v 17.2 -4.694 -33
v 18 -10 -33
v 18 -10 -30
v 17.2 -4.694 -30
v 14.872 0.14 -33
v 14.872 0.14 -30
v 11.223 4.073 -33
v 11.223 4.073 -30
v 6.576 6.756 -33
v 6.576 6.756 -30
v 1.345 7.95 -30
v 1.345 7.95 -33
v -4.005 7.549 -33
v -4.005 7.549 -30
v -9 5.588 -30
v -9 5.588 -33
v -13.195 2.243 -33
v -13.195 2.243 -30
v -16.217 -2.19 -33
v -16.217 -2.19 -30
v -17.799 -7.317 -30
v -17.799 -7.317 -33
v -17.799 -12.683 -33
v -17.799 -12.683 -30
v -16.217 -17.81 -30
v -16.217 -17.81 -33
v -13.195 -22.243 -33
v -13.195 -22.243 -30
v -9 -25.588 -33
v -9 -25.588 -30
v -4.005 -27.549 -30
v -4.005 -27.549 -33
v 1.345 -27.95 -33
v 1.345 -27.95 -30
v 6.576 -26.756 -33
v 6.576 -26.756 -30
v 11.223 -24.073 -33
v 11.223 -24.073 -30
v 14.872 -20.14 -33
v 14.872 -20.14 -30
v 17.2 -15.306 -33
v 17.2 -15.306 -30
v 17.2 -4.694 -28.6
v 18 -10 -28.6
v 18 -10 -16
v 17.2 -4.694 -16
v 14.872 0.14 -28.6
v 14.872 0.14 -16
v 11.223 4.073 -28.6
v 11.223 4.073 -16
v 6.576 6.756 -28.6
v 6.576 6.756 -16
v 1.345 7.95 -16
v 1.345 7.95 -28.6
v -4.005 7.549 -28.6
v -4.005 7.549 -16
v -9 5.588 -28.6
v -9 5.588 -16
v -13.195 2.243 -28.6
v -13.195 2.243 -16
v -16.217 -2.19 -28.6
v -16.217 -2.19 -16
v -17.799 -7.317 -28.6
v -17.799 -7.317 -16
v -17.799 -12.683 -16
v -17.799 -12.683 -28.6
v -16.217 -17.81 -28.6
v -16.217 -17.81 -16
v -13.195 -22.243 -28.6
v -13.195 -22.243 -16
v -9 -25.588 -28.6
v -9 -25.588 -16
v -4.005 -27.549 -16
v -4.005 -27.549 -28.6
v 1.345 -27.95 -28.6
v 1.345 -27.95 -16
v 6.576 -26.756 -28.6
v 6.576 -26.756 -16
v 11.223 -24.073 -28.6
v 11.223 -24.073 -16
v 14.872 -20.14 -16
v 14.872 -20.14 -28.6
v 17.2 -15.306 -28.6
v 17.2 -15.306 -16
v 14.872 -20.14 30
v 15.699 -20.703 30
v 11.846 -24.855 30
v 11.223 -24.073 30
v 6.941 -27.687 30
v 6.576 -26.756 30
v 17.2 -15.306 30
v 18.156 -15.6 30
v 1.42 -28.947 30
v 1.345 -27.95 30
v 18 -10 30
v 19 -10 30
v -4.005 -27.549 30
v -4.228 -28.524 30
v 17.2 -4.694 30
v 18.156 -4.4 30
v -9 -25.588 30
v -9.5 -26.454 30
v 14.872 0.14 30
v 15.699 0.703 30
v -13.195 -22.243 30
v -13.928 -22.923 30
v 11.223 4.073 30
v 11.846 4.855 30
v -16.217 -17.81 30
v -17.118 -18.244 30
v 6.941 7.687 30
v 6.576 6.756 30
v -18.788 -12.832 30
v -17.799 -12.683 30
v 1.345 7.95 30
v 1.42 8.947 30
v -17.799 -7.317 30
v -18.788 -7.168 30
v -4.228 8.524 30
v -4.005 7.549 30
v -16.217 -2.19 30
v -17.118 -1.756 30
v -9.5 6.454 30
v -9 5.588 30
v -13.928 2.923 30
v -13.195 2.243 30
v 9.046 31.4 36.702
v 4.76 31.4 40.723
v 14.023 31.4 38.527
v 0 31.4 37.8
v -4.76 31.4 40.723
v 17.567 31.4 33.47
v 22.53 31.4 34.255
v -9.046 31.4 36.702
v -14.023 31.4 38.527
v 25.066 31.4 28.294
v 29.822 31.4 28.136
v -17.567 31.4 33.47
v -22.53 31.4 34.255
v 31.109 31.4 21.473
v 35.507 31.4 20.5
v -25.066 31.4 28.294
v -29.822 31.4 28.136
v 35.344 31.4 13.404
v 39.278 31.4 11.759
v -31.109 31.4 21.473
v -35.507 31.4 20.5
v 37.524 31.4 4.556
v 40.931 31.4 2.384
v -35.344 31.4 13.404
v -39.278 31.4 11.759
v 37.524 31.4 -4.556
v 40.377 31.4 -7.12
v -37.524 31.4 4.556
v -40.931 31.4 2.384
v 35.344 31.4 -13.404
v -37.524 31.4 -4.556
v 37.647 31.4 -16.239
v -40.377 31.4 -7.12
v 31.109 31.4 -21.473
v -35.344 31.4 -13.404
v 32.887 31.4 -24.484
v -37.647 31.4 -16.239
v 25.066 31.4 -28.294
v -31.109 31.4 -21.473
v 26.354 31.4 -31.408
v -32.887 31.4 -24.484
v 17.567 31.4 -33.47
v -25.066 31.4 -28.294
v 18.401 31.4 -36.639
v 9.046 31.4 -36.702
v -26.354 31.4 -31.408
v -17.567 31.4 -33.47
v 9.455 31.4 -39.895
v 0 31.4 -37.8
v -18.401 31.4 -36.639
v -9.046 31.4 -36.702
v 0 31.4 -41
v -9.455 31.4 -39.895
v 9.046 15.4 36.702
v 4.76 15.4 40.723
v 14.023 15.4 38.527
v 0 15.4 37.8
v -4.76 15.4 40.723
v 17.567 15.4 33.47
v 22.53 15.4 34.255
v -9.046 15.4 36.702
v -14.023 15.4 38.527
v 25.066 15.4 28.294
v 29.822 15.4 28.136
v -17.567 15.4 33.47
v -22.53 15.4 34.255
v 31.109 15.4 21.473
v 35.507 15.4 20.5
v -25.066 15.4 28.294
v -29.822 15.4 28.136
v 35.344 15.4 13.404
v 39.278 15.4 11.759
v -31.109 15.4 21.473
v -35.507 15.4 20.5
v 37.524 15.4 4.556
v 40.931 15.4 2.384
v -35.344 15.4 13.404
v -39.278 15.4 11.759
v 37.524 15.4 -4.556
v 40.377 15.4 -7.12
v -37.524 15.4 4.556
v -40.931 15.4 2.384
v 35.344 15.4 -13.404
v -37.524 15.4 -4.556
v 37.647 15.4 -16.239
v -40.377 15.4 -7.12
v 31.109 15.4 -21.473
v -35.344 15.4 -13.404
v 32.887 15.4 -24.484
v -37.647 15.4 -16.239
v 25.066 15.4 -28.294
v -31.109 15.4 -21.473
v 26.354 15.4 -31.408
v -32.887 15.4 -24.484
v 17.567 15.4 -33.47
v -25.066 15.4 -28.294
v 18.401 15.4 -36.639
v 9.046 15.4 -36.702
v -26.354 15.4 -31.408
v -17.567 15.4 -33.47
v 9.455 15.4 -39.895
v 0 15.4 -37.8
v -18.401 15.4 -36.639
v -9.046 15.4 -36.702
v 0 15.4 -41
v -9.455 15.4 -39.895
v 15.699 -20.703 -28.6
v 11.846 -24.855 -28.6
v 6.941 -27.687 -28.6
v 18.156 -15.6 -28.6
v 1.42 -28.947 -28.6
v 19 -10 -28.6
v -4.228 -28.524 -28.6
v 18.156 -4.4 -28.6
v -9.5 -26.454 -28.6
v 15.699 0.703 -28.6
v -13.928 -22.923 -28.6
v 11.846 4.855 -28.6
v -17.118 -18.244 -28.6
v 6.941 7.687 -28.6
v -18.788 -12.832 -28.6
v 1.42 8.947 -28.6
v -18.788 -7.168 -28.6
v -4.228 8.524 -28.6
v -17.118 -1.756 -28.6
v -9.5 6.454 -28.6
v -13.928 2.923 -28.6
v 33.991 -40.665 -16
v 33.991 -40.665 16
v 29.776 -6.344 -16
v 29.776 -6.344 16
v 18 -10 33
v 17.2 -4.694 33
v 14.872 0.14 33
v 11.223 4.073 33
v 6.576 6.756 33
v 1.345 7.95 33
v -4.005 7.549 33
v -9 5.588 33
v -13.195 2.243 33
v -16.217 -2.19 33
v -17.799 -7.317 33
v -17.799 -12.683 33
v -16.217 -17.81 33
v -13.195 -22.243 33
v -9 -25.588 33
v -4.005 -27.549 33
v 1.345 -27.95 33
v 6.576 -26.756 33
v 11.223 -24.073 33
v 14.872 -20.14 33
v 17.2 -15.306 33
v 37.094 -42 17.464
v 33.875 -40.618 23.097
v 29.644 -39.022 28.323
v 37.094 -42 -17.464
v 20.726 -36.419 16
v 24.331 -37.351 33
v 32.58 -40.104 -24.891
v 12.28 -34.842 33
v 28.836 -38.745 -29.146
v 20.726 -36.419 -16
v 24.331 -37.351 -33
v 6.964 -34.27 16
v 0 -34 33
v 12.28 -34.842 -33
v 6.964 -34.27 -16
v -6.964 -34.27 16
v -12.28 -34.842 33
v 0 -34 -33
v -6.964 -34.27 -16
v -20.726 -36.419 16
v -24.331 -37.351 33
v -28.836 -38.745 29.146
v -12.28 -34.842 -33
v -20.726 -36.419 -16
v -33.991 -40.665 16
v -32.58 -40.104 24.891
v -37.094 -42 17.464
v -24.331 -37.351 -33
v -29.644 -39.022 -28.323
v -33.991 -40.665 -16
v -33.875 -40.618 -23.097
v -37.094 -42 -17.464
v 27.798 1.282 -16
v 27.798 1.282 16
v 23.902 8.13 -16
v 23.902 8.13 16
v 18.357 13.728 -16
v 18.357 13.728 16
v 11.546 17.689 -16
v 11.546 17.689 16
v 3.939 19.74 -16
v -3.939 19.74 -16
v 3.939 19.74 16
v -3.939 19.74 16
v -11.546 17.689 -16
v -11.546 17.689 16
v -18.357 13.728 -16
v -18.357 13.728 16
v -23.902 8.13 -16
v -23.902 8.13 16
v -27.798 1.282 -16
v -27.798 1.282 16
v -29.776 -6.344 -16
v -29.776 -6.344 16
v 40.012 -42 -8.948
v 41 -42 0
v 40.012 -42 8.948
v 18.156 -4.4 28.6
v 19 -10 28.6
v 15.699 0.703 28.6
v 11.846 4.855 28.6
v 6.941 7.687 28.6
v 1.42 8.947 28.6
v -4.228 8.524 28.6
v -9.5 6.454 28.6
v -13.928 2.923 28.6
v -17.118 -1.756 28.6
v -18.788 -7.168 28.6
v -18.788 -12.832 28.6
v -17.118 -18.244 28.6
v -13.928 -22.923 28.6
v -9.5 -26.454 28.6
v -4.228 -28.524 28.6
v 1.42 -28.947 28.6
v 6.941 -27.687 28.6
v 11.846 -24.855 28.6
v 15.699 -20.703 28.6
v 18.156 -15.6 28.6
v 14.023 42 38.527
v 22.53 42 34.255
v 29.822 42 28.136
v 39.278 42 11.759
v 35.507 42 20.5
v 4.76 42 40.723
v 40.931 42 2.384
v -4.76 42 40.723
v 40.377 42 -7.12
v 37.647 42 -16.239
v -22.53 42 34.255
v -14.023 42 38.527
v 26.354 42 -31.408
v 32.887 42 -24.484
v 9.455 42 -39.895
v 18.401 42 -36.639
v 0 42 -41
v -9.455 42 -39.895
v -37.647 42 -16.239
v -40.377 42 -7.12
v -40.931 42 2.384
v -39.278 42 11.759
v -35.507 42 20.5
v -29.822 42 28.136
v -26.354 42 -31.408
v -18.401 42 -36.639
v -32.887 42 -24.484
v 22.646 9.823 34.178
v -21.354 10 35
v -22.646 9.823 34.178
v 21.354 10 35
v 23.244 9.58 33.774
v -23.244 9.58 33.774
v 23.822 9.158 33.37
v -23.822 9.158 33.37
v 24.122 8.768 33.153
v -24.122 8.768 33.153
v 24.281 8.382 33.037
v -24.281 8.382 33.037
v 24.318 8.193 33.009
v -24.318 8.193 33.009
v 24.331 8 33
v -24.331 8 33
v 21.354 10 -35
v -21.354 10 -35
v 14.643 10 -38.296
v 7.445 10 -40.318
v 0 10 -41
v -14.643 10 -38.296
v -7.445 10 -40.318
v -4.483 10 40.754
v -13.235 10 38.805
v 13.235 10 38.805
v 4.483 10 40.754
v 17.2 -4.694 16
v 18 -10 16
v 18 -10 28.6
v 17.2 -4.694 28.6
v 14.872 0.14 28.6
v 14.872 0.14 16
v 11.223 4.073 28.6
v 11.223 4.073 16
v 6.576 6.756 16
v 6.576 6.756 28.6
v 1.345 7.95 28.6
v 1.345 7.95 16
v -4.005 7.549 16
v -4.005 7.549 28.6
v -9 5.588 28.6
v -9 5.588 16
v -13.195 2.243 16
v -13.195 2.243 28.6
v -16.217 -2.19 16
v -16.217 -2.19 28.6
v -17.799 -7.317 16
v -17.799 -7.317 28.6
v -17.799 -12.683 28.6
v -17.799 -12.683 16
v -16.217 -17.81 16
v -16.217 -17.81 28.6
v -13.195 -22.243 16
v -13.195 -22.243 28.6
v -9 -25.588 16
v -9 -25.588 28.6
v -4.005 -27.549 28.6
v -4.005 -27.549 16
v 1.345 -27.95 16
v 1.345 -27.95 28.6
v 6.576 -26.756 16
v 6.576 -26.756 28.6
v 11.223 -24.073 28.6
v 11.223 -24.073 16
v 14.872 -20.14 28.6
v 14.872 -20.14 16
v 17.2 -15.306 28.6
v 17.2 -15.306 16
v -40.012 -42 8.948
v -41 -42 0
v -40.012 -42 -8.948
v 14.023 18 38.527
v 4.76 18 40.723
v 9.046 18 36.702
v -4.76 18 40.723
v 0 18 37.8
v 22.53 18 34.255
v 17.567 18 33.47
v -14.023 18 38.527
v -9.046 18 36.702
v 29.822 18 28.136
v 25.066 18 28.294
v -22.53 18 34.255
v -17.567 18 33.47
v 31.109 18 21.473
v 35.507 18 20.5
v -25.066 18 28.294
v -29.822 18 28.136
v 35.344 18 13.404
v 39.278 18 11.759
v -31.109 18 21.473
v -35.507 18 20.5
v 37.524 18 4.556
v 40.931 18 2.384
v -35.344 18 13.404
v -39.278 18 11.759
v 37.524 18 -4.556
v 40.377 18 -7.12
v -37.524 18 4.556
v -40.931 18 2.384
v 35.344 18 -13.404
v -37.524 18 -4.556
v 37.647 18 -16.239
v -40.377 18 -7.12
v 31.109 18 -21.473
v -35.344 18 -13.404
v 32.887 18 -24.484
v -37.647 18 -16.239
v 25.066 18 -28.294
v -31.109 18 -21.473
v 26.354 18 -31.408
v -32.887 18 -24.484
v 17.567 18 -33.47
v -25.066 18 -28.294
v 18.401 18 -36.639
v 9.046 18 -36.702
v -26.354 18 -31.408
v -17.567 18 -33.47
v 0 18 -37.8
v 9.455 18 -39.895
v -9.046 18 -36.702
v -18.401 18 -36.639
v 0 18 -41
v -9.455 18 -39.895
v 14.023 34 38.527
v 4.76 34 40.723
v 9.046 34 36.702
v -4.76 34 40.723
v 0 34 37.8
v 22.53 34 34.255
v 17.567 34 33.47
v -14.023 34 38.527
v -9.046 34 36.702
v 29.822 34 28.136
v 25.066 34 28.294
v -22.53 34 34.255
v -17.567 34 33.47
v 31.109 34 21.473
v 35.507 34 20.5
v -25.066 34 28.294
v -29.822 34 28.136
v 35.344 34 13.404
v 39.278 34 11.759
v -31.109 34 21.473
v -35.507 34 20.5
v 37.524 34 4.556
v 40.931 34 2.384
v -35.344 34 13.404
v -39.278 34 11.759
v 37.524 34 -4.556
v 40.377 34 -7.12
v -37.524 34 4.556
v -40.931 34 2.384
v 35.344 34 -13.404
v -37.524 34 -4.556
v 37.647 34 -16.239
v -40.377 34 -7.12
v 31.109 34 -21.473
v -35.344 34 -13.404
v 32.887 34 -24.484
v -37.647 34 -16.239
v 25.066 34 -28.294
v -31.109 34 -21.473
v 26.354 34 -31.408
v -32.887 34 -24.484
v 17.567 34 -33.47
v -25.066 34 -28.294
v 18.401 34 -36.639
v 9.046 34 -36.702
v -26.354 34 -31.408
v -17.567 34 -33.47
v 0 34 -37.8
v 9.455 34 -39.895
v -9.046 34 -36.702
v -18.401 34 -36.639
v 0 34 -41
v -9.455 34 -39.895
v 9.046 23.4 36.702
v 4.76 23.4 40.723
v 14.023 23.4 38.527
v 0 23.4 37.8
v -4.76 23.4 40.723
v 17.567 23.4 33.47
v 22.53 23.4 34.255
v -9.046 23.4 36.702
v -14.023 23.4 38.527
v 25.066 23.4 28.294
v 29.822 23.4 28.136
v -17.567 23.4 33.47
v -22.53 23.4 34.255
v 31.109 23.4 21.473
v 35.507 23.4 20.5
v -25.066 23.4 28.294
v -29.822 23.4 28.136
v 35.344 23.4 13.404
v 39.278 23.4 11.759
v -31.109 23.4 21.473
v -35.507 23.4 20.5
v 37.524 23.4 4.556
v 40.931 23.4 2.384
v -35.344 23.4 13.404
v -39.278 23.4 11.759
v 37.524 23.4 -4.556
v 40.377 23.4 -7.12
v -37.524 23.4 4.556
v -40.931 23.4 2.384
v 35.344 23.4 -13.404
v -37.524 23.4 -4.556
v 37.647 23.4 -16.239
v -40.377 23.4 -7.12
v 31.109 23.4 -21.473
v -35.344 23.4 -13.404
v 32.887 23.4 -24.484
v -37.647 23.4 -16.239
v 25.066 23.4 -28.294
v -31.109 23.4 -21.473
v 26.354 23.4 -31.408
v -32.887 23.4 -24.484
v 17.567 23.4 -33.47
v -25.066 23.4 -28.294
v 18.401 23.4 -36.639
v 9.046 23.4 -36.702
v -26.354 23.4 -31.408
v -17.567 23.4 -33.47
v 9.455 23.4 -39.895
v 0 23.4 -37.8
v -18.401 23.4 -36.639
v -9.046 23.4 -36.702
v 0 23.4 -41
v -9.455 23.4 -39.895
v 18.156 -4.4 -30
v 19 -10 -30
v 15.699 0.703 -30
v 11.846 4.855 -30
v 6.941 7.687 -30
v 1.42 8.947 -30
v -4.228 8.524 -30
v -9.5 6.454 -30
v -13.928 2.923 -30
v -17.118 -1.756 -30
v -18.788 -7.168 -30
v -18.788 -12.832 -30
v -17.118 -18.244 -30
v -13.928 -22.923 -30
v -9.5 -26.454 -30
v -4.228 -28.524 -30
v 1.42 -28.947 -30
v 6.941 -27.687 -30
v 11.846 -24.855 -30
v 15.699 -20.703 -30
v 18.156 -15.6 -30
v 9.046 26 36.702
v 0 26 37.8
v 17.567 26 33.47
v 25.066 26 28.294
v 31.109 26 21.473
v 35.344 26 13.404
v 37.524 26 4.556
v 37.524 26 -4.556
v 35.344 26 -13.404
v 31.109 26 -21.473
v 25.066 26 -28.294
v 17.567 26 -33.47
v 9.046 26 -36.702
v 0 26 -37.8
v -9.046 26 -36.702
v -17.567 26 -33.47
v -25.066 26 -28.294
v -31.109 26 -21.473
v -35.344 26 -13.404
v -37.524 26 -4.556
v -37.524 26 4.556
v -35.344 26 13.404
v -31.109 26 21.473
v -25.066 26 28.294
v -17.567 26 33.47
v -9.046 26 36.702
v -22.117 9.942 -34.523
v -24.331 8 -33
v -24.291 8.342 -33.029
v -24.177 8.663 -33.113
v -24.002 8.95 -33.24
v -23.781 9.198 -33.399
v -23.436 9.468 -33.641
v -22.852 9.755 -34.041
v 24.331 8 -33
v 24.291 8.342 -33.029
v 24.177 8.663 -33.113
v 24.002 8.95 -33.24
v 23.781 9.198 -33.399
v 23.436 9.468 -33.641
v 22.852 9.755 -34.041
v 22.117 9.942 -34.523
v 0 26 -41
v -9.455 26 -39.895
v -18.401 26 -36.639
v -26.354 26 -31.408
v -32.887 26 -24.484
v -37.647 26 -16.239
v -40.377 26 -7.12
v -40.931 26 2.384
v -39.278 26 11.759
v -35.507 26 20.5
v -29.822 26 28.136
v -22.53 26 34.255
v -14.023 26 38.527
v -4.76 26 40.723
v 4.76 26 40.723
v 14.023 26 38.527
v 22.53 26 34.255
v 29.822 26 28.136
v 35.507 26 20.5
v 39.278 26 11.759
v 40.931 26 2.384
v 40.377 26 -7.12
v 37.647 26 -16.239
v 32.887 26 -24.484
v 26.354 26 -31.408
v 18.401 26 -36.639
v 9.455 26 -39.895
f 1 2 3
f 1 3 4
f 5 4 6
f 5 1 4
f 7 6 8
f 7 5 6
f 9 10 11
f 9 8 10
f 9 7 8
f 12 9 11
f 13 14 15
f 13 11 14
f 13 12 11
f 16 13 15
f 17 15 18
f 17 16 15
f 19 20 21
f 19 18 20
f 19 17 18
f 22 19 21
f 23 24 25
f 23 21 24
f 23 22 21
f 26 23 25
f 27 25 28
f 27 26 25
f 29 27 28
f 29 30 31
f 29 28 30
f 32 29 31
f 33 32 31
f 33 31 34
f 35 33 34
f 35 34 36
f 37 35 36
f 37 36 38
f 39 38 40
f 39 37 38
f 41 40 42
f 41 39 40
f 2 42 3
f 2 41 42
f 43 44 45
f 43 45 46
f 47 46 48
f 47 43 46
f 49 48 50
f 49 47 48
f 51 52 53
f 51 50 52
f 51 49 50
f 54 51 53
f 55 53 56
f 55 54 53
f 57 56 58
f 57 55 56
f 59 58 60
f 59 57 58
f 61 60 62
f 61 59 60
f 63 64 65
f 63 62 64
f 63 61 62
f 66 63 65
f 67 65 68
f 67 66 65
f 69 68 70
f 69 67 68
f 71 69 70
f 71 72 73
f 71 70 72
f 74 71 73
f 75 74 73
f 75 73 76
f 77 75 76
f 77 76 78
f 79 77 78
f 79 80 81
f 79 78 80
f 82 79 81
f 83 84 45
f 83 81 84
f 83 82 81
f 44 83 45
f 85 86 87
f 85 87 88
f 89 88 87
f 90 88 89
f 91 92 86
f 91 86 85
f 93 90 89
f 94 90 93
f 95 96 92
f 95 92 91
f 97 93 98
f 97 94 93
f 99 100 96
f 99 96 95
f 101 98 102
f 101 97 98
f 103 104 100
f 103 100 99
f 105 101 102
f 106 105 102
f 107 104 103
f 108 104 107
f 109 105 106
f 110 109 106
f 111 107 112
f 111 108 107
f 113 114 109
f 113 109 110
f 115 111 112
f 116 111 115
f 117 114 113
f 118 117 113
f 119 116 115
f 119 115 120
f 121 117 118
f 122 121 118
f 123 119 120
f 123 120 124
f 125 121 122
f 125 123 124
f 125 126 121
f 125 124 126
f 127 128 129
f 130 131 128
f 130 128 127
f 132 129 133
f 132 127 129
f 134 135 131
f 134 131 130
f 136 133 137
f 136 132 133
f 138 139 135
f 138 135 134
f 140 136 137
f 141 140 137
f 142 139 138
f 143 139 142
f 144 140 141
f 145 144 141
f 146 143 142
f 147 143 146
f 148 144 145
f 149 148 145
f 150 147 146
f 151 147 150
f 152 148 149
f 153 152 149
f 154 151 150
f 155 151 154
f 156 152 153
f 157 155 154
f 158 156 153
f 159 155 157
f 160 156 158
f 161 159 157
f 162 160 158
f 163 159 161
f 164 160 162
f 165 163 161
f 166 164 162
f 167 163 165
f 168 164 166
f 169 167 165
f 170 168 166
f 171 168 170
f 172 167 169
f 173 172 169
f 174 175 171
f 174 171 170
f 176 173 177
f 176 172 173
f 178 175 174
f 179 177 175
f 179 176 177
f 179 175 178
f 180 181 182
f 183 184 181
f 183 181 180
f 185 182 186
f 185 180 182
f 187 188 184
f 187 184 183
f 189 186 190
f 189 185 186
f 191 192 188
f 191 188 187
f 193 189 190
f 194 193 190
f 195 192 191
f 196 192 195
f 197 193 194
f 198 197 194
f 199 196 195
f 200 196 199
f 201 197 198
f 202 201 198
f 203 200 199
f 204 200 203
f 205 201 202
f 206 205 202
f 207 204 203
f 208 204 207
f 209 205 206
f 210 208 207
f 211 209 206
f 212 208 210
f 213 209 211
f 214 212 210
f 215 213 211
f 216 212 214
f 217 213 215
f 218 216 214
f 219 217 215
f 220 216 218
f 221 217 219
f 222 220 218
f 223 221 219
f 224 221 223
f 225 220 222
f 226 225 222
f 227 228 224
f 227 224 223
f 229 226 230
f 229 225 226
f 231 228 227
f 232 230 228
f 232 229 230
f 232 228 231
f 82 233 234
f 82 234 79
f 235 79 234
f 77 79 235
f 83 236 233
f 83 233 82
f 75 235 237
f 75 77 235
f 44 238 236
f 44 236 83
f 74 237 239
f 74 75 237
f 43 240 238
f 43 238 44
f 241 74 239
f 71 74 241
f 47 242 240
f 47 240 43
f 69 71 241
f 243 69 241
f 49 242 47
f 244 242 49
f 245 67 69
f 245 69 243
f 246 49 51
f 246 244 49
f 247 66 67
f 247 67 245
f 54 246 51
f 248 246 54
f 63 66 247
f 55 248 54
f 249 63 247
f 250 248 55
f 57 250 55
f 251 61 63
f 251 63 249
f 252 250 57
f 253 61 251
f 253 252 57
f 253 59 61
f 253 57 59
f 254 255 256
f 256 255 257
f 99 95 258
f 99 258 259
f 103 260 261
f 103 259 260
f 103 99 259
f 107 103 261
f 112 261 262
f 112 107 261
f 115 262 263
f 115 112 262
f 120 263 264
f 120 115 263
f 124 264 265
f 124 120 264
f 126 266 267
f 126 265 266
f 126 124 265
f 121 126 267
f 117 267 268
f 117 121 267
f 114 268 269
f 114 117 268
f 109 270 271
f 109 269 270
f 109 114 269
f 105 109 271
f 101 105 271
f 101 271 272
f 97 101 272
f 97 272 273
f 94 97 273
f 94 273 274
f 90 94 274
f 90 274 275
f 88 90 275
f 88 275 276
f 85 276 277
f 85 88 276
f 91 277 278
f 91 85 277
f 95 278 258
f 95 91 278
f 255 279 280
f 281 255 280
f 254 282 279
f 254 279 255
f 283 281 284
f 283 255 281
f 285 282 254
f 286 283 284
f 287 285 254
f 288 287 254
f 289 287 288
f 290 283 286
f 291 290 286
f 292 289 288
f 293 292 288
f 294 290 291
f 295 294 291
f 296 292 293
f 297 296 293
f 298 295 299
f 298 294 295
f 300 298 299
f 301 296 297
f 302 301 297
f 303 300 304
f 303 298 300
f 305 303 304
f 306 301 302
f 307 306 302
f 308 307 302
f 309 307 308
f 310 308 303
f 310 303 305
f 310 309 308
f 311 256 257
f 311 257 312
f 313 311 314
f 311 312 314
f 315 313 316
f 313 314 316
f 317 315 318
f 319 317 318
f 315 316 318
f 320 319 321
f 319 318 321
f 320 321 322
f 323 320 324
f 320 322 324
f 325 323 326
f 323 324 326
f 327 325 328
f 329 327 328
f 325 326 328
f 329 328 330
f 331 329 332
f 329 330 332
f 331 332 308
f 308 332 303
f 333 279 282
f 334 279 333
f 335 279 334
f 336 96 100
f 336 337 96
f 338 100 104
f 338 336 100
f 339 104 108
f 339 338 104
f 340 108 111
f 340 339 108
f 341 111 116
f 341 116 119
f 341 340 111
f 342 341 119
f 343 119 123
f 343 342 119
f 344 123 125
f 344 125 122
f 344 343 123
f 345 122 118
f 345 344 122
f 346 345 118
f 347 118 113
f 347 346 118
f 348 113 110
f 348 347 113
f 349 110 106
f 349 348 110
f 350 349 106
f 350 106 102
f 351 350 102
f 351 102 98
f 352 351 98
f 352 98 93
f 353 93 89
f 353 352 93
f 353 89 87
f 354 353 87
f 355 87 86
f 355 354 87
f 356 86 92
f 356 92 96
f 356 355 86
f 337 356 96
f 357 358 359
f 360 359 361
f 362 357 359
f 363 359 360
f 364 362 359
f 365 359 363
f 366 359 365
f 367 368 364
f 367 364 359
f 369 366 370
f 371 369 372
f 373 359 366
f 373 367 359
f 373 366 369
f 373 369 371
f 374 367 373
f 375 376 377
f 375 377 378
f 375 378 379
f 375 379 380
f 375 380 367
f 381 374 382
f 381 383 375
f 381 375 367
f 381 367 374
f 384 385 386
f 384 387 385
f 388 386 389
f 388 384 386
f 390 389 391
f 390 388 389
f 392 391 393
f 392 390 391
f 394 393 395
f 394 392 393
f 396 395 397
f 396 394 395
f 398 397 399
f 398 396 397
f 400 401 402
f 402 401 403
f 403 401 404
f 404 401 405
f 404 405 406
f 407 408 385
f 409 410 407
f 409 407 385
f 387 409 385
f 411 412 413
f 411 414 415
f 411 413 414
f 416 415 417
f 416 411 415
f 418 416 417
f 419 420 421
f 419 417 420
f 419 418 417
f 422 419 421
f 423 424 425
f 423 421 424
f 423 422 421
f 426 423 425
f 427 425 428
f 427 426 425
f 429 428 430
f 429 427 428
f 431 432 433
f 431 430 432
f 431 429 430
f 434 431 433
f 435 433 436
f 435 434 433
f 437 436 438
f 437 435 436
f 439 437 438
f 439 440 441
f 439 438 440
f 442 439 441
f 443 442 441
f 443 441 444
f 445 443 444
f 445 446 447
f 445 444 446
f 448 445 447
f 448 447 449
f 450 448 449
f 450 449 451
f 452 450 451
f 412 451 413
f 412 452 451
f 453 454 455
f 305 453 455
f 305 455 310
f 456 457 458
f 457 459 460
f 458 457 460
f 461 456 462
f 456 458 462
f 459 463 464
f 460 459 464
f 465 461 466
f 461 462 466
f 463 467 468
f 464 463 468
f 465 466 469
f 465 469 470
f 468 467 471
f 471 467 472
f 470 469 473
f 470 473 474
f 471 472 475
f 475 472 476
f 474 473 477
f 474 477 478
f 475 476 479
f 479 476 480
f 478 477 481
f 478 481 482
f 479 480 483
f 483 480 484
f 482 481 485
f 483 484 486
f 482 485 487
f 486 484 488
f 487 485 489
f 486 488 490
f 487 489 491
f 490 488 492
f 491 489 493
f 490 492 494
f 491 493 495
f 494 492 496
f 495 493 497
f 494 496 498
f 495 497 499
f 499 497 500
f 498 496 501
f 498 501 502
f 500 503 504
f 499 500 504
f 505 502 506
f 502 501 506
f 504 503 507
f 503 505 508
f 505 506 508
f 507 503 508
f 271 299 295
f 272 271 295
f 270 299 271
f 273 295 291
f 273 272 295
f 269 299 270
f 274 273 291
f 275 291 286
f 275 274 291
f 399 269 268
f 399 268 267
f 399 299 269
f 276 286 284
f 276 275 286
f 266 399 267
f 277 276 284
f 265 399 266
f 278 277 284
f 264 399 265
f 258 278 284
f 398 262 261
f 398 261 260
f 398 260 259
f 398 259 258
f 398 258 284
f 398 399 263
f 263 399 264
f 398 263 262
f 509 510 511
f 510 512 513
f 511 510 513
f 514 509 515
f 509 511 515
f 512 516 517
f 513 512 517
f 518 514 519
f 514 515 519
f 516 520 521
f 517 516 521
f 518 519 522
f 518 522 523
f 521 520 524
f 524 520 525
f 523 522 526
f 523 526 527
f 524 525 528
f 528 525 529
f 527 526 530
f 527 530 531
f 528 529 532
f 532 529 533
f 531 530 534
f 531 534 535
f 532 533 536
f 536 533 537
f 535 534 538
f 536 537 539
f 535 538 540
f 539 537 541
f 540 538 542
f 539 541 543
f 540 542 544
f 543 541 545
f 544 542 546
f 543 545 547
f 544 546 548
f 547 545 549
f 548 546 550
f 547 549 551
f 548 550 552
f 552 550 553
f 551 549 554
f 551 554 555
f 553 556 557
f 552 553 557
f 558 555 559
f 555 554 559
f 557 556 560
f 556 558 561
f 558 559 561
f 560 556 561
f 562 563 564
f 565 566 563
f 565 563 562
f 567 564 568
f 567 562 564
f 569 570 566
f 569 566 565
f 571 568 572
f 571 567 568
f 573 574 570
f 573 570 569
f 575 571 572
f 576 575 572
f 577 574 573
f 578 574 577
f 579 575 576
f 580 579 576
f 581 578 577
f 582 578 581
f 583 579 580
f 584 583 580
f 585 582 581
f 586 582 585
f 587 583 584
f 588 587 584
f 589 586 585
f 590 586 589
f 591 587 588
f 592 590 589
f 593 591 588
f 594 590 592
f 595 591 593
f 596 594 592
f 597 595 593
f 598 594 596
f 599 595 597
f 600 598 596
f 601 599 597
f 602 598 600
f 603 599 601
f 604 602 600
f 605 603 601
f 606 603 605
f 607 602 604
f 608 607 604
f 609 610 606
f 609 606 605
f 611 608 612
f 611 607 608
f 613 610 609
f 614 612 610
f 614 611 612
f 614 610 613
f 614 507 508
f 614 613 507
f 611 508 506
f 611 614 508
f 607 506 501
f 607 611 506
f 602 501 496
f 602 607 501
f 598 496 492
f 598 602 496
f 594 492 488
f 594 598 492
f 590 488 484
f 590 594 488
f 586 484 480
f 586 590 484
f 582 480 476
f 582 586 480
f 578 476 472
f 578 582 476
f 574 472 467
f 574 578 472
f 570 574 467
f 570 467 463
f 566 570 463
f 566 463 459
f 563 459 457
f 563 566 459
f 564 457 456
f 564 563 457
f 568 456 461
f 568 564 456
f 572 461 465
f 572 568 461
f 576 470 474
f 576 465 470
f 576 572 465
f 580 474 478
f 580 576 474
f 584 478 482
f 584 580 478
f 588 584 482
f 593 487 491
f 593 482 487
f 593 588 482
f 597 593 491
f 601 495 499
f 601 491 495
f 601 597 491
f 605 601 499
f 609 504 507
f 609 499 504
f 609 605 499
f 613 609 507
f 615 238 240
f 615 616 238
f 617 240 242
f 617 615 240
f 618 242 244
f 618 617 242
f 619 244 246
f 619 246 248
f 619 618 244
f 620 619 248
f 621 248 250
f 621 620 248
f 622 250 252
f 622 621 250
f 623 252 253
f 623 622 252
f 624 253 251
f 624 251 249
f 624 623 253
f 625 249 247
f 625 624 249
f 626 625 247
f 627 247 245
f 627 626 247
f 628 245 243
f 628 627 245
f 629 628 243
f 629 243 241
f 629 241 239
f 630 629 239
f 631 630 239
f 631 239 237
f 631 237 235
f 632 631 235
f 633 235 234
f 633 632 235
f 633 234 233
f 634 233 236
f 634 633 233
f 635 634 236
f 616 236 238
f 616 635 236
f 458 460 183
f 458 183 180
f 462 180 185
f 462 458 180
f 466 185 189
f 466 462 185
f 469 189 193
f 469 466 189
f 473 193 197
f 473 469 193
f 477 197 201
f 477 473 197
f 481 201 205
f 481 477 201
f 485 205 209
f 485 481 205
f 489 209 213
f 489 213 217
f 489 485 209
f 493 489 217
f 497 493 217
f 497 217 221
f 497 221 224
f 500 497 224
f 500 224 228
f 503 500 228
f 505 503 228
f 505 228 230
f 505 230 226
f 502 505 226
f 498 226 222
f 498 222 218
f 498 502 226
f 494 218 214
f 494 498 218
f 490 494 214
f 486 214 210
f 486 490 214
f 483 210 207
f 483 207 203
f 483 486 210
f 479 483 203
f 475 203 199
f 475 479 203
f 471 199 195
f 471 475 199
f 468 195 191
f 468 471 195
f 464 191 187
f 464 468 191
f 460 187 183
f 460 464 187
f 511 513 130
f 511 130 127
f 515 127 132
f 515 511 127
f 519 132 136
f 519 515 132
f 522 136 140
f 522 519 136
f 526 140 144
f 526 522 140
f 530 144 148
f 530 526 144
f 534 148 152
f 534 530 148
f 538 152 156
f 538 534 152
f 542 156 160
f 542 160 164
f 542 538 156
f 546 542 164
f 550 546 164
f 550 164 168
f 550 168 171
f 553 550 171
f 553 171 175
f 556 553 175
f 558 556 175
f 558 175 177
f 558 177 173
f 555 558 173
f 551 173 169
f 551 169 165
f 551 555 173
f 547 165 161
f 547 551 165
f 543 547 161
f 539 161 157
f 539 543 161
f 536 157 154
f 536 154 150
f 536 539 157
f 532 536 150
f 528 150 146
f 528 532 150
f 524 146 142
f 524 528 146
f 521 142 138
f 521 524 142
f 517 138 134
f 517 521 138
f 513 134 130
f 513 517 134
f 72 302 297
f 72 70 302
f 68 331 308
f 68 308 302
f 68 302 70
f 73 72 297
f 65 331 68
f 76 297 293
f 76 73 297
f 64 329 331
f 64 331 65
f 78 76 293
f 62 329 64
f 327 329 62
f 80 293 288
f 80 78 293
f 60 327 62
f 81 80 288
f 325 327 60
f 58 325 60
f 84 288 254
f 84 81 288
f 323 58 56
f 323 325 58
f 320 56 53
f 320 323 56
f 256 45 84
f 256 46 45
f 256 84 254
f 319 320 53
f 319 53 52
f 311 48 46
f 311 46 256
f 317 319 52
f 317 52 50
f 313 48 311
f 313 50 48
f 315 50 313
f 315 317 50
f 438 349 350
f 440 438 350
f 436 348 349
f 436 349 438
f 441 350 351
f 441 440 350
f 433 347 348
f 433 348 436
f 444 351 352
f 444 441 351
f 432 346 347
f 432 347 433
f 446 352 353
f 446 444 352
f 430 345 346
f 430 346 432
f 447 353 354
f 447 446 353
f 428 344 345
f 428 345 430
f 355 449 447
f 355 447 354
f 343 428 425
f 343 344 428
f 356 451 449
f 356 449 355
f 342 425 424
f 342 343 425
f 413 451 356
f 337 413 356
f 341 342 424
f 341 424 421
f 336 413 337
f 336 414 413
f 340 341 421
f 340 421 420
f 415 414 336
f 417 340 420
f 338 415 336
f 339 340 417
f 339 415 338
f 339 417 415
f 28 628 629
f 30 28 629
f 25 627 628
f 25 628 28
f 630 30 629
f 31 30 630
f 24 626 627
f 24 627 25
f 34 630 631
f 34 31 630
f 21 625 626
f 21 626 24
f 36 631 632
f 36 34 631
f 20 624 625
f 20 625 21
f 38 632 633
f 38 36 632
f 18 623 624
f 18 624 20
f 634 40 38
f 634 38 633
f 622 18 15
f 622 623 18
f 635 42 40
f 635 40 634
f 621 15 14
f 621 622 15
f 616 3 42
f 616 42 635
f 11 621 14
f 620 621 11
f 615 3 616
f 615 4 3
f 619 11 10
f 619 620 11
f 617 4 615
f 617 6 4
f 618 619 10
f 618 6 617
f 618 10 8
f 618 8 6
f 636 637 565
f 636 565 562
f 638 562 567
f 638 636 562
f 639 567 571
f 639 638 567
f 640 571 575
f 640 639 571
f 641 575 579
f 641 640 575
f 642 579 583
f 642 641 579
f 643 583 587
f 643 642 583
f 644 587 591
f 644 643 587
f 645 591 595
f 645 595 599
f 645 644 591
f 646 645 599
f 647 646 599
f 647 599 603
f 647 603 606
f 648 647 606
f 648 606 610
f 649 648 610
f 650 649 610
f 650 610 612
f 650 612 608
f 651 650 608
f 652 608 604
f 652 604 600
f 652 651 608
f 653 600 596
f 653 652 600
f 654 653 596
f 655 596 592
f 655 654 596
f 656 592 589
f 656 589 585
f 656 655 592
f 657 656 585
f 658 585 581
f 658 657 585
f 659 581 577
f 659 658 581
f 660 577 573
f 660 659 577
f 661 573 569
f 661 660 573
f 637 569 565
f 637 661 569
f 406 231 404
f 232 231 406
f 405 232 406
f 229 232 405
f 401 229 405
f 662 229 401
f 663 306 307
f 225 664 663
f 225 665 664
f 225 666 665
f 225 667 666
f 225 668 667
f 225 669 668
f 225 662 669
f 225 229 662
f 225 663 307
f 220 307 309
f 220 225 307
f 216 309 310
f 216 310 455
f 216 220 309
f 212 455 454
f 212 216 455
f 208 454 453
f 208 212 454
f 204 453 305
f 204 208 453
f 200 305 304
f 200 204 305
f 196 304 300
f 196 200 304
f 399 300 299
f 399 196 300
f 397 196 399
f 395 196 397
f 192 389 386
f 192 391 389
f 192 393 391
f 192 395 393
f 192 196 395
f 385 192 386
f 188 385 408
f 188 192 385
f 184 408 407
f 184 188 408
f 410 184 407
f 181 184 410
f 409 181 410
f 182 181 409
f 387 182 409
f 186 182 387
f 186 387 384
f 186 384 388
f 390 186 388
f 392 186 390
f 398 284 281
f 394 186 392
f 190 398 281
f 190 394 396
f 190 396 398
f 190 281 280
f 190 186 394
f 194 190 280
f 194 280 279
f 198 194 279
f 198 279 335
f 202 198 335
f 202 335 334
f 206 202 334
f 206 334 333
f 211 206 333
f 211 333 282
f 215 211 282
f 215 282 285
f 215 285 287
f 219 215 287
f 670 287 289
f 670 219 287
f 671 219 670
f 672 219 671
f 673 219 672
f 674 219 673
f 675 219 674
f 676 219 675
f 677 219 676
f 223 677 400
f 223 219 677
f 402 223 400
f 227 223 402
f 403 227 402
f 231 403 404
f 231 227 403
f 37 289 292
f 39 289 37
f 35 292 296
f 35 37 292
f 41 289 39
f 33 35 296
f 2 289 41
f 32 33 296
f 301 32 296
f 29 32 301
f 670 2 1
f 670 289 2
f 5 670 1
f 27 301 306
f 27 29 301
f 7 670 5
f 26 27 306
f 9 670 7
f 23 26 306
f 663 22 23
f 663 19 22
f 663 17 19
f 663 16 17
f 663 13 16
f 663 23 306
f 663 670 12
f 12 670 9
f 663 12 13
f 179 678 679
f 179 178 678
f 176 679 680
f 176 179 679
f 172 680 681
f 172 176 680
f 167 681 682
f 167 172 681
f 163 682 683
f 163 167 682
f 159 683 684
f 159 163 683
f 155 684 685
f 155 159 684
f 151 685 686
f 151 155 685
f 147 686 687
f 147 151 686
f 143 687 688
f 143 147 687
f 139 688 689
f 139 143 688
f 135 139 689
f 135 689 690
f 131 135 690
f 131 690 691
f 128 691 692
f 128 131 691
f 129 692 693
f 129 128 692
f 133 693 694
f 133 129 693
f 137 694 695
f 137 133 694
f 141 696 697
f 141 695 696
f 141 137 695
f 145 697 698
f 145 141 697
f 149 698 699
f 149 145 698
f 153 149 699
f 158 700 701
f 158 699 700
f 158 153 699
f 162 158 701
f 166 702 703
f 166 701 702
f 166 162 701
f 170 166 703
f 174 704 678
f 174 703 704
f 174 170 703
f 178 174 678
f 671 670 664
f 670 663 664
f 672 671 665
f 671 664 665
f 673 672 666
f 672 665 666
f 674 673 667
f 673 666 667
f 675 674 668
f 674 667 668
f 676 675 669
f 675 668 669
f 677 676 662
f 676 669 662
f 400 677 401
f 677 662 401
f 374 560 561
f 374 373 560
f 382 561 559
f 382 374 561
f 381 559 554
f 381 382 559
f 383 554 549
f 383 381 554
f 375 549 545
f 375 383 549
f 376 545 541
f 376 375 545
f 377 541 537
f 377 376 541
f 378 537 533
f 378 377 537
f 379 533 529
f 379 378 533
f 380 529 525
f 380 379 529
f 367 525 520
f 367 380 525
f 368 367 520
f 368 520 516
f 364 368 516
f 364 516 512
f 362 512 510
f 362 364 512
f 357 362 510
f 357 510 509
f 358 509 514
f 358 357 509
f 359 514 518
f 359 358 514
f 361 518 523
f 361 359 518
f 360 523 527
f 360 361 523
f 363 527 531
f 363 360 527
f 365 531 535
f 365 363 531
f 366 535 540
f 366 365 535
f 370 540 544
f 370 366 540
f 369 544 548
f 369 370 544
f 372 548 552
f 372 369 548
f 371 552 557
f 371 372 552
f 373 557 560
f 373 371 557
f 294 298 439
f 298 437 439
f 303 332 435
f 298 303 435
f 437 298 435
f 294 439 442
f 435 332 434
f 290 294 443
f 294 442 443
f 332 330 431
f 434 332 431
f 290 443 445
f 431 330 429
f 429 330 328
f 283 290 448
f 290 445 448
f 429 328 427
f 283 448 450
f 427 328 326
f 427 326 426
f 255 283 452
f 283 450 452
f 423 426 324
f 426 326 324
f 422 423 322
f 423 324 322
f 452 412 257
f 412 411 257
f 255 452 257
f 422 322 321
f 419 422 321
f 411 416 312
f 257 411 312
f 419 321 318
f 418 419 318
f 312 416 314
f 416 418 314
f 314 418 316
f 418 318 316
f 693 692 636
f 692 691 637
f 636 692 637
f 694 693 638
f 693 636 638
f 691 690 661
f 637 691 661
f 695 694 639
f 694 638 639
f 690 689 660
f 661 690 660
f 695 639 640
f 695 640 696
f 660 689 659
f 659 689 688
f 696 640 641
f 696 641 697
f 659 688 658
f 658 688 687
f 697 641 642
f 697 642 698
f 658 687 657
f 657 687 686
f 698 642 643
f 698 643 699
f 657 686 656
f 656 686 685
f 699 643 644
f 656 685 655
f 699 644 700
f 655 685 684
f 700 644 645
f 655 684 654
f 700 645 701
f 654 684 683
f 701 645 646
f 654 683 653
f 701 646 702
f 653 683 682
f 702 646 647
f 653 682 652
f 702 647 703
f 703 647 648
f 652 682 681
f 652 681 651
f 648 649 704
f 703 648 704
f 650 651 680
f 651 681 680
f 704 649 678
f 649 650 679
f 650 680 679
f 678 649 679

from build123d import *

# Parameters (mm, degrees)
SKETCH_13_R              = 41
EXTRUDE_3_DEPTH          = 42
CUT_EXTRUDE_1_DEPTH      = 72.596089278675
CUT_EXTRUDE_1_DEPTH_BACK = 72.596089278675
SKETCH_14_R              = 17.999999999999996
CUT_EXTRUDE_START        = -52
CUT_EXTRUDE_3_DEPTH      = 52
CUT_EXTRUDE_4_DEPTH      = 16
CUT_EXTRUDE_START_2      = -8
SKETCH_20_R              = 41
SKETCH_20_R_2            = 37.8
CUT_EXTRUDE_5_DEPTH      = 2.6
PATTERN_LINEAR_1_COUNT   = 3
PATTERN_LINEAR_1_PITCH   = 8
FILLET_1_R               = 2


with BuildPart() as part:
    # Эскиз13 → Бобышка-Вытянуть3 (new, symmetric)
    with BuildSketch(Plane(origin=(0, 0, 0), x_dir=(1, 0, 0), z_dir=(0, 1, 0))):
        with Locations(Location((0, 0, 0), (0, 0, 90))):
            Circle(SKETCH_13_R)
    extrude(amount=EXTRUDE_3_DEPTH, both=True)

    # Эскиз14 → Вырез-Вытянуть1 (cut, two sides: drawn at the far end of the back side and taken through both)
    with BuildSketch(Plane.XY.offset(-CUT_EXTRUDE_1_DEPTH_BACK)):
        with BuildLine():
            Line((-37.09447398198258, -41.99999999999993), (37.09447398198258, -41.99999999999993))
            ThreePointArc((37.09447398198258, -41.99999999999993), (5.51e-15, -34.00000000000003), (-37.09447398198258, -41.99999999999993))
        make_face()
        with Locations((0, -10.000000000000009)):
            Circle(SKETCH_14_R)
    extrude(amount=CUT_EXTRUDE_1_DEPTH + CUT_EXTRUDE_1_DEPTH_BACK, mode=Mode.SUBTRACT)

    # Эскиз16 → Вырез-Вытянуть3 (cut)
    with BuildSketch(Plane.XZ.offset(42).offset(CUT_EXTRUDE_START)):
        with BuildLine():
            ThreePointArc((24.331050121192877, 33), (2.51e-15, 41), (-24.33105012119288, 33))
            Line((-24.331050121192874, 33), (24.331050121192874, 33))
        make_face()
        with BuildLine():
            Line((24.331050121192874, -33), (-24.331050121192874, -33))
            ThreePointArc((-24.331050121192902, -32.99999999999998), (-7.53e-15, -41), (24.331050121192863, -33.000000000000014))
        make_face()
    extrude(amount=CUT_EXTRUDE_3_DEPTH, mode=Mode.SUBTRACT)

    # Эскиз18 → Вырез-Вытянуть4 (cut, symmetric)
    with BuildSketch(Plane.XY):
        with BuildLine():
            Line((-29.77638454923953, -6.3439196978451875), (-34.154400712657626, -42.00000000000001))
            Line((-34.154400712657626, -42.00000000000001), (34.15440071265802, -42.00000000000002))
            Line((34.15440071265802, -42.00000000000002), (29.7763845492392, -6.3439196978452435))
            ThreePointArc((29.7763845492392, -6.3439196978452435), (1.516e-14, 19.999999999999574), (-29.77638454923953, -6.3439196978451875))
        make_face()
    extrude(amount=CUT_EXTRUDE_4_DEPTH, both=True, mode=Mode.SUBTRACT)

    # Эскиз20 → Вырез-Вытянуть5 (cut)
    with BuildSketch(Plane(origin=(0, 42, 0), x_dir=(1, 0, 0), z_dir=(0, 1, 0)).offset(CUT_EXTRUDE_START_2)):
        with Locations(Location((0, 0, 0), (0, 0, 53.598479946))):
            Circle(SKETCH_20_R)
        with Locations(Location((0, 0, 0), (0, 0, 270))):
            Circle(SKETCH_20_R_2, mode=Mode.SUBTRACT)
    cut_extrude_5 = extrude(amount=-CUT_EXTRUDE_5_DEPTH, mode=Mode.SUBTRACT)

    # Линейный массив1: Вырез-Вытянуть5 ×3
    with Locations(*[(0, -i * PATTERN_LINEAR_1_PITCH, 0) for i in range(1, PATTERN_LINEAR_1_COUNT)]):
        add(cut_extrude_5, mode=Mode.SUBTRACT)

    # Скругление1
    fillet_1_edges = [part.edges().sort_by_distance(p)[0] for p in [
        (0, 10, 33),
        (0, 10, -33),
    ]]
    fillet(fillet_1_edges, radius=FILLET_1_R)

    # Эскиз24 → Вырез-Повернуть3 (revolve, cut)
    with BuildSketch(Plane(origin=(0, 0, 0), x_dir=(0, 0, -1), z_dir=(1, 0, 0)), mode=Mode.PRIVATE) as cut_revolve_3_sk:
        Polygon((-30.000000000000085, -29.00000000000005), (-28.600000000000087, -29.000000000000053), (-28.60000000000009, -10.000000000000053), (-30.000000000000085, -10.000000000000053), align=None)
        Polygon((28.600000000000215, -10.000000000000046), (28.600000000000218, -29.000000000000046), (30.000000000000213, -29.000000000000043), (30.00000000000021, -10.000000000000046), align=None)
    revolve(cut_revolve_3_sk.sketch.rotate(Axis((0, -10.000000000000009, -456.95829419610067), (0, 0, 1)), 90), axis=Axis((0, -10.000000000000009, -456.95829419610067), (0, 0, 1)), mode=Mode.SUBTRACT)


solid = part.part
